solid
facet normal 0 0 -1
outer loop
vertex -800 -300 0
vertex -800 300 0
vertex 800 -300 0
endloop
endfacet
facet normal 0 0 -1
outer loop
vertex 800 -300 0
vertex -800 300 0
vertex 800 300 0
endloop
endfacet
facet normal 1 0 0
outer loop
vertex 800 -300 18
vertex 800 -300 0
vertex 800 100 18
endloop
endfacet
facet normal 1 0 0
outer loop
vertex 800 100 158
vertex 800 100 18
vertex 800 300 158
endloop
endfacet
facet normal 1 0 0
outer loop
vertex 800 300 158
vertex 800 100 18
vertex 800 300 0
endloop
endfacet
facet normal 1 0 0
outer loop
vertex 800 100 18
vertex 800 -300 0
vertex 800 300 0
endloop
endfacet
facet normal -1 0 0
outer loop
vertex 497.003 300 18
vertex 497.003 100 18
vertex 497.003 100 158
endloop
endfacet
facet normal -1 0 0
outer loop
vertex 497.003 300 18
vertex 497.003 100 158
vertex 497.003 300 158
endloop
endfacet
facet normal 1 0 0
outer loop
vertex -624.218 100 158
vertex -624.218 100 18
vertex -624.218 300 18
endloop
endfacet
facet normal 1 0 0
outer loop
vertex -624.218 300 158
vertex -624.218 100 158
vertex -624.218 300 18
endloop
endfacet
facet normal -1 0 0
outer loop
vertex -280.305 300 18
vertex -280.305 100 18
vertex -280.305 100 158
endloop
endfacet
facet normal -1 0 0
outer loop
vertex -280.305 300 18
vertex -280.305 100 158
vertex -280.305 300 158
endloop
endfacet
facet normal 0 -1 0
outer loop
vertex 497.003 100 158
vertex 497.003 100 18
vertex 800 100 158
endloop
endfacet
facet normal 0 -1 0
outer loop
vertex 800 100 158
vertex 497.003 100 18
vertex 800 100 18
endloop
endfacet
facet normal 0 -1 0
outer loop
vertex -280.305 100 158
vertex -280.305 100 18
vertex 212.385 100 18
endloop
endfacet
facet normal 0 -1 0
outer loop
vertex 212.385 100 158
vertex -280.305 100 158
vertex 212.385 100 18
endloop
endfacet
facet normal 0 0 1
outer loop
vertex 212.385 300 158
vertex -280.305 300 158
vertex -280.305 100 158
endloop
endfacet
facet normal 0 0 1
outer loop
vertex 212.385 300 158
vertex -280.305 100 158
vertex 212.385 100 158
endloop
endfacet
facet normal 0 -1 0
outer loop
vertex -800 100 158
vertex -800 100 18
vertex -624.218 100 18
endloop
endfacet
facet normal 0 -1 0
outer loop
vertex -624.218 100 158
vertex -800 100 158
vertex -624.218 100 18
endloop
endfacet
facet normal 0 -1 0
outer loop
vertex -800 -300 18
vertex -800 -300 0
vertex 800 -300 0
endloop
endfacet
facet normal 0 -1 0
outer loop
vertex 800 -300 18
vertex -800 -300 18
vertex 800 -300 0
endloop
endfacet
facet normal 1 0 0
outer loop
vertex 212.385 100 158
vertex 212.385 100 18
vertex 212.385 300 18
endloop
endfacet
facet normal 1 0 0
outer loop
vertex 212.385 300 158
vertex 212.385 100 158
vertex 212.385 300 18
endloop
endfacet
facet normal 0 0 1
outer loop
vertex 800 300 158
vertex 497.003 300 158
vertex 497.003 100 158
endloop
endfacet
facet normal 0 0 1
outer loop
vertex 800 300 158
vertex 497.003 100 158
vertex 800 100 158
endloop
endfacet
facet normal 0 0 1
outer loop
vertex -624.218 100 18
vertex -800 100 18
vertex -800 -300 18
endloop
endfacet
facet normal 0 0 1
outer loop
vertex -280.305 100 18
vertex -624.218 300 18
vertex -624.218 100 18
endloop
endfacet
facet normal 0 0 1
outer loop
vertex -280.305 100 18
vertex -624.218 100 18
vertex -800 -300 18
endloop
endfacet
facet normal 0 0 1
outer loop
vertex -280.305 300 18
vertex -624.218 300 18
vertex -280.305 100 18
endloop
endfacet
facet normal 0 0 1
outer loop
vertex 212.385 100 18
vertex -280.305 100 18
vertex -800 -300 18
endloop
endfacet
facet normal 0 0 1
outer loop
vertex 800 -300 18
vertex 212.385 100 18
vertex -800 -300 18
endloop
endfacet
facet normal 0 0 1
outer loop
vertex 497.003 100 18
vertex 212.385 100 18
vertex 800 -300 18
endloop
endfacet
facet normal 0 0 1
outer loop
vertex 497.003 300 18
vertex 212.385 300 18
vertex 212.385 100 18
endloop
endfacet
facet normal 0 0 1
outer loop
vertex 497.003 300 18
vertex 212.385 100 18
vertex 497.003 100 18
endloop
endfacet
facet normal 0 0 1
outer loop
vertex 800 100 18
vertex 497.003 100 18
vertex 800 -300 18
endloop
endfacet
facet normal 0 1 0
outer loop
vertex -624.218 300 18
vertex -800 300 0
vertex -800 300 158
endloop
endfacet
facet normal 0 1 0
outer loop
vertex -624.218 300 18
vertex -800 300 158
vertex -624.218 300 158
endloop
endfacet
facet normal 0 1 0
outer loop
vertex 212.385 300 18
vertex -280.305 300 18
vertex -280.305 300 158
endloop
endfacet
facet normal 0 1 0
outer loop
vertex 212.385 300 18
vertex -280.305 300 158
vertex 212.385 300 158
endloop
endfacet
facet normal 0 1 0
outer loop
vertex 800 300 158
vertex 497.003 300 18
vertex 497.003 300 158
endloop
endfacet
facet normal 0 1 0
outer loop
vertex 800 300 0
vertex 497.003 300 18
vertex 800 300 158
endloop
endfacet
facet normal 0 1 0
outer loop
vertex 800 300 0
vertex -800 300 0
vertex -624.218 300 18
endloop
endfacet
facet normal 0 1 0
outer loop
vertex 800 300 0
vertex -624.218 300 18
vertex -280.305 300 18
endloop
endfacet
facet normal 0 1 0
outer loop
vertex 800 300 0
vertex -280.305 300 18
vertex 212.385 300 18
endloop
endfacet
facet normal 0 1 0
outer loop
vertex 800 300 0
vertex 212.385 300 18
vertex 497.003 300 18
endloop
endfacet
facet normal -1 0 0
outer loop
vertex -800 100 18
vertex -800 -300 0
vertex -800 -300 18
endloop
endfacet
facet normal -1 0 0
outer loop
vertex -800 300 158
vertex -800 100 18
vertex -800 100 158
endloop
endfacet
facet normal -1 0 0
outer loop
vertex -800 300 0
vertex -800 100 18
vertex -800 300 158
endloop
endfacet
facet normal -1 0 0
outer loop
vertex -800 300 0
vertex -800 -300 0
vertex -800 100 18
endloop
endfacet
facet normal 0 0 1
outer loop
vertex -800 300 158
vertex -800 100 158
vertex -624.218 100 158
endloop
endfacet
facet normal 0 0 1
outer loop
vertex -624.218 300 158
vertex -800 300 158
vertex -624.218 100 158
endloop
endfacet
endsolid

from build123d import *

# Parameters (mm, degrees)
F0_W     = 1600
F0_H     = 600
F1_DEPTH = 18
F2_W     = 302.996802
F2_H     = 200
F2_W_2   = 492.690444
F2_W_3   = 175.781536
F3_DEPTH = 140


with BuildPart() as f1:
    # F0 (on Top) → F1 (new body)
    with BuildSketch(Plane.XY):
        Rectangle(F0_W, F0_H)
    extrude(amount=F1_DEPTH)

    # F2 (on face) → F3 (join)
    with BuildSketch(Plane.XY.offset(18)):
        with Locations((648.501599, 200)):
            Rectangle(F2_W, F2_H)
        with Locations((-33.959925, 200)):
            Rectangle(F2_W_2, F2_H)
        with Locations((-712.109232, 200)):
            Rectangle(F2_W_3, F2_H)
    extrude(amount=F3_DEPTH)


solid = f1.part
